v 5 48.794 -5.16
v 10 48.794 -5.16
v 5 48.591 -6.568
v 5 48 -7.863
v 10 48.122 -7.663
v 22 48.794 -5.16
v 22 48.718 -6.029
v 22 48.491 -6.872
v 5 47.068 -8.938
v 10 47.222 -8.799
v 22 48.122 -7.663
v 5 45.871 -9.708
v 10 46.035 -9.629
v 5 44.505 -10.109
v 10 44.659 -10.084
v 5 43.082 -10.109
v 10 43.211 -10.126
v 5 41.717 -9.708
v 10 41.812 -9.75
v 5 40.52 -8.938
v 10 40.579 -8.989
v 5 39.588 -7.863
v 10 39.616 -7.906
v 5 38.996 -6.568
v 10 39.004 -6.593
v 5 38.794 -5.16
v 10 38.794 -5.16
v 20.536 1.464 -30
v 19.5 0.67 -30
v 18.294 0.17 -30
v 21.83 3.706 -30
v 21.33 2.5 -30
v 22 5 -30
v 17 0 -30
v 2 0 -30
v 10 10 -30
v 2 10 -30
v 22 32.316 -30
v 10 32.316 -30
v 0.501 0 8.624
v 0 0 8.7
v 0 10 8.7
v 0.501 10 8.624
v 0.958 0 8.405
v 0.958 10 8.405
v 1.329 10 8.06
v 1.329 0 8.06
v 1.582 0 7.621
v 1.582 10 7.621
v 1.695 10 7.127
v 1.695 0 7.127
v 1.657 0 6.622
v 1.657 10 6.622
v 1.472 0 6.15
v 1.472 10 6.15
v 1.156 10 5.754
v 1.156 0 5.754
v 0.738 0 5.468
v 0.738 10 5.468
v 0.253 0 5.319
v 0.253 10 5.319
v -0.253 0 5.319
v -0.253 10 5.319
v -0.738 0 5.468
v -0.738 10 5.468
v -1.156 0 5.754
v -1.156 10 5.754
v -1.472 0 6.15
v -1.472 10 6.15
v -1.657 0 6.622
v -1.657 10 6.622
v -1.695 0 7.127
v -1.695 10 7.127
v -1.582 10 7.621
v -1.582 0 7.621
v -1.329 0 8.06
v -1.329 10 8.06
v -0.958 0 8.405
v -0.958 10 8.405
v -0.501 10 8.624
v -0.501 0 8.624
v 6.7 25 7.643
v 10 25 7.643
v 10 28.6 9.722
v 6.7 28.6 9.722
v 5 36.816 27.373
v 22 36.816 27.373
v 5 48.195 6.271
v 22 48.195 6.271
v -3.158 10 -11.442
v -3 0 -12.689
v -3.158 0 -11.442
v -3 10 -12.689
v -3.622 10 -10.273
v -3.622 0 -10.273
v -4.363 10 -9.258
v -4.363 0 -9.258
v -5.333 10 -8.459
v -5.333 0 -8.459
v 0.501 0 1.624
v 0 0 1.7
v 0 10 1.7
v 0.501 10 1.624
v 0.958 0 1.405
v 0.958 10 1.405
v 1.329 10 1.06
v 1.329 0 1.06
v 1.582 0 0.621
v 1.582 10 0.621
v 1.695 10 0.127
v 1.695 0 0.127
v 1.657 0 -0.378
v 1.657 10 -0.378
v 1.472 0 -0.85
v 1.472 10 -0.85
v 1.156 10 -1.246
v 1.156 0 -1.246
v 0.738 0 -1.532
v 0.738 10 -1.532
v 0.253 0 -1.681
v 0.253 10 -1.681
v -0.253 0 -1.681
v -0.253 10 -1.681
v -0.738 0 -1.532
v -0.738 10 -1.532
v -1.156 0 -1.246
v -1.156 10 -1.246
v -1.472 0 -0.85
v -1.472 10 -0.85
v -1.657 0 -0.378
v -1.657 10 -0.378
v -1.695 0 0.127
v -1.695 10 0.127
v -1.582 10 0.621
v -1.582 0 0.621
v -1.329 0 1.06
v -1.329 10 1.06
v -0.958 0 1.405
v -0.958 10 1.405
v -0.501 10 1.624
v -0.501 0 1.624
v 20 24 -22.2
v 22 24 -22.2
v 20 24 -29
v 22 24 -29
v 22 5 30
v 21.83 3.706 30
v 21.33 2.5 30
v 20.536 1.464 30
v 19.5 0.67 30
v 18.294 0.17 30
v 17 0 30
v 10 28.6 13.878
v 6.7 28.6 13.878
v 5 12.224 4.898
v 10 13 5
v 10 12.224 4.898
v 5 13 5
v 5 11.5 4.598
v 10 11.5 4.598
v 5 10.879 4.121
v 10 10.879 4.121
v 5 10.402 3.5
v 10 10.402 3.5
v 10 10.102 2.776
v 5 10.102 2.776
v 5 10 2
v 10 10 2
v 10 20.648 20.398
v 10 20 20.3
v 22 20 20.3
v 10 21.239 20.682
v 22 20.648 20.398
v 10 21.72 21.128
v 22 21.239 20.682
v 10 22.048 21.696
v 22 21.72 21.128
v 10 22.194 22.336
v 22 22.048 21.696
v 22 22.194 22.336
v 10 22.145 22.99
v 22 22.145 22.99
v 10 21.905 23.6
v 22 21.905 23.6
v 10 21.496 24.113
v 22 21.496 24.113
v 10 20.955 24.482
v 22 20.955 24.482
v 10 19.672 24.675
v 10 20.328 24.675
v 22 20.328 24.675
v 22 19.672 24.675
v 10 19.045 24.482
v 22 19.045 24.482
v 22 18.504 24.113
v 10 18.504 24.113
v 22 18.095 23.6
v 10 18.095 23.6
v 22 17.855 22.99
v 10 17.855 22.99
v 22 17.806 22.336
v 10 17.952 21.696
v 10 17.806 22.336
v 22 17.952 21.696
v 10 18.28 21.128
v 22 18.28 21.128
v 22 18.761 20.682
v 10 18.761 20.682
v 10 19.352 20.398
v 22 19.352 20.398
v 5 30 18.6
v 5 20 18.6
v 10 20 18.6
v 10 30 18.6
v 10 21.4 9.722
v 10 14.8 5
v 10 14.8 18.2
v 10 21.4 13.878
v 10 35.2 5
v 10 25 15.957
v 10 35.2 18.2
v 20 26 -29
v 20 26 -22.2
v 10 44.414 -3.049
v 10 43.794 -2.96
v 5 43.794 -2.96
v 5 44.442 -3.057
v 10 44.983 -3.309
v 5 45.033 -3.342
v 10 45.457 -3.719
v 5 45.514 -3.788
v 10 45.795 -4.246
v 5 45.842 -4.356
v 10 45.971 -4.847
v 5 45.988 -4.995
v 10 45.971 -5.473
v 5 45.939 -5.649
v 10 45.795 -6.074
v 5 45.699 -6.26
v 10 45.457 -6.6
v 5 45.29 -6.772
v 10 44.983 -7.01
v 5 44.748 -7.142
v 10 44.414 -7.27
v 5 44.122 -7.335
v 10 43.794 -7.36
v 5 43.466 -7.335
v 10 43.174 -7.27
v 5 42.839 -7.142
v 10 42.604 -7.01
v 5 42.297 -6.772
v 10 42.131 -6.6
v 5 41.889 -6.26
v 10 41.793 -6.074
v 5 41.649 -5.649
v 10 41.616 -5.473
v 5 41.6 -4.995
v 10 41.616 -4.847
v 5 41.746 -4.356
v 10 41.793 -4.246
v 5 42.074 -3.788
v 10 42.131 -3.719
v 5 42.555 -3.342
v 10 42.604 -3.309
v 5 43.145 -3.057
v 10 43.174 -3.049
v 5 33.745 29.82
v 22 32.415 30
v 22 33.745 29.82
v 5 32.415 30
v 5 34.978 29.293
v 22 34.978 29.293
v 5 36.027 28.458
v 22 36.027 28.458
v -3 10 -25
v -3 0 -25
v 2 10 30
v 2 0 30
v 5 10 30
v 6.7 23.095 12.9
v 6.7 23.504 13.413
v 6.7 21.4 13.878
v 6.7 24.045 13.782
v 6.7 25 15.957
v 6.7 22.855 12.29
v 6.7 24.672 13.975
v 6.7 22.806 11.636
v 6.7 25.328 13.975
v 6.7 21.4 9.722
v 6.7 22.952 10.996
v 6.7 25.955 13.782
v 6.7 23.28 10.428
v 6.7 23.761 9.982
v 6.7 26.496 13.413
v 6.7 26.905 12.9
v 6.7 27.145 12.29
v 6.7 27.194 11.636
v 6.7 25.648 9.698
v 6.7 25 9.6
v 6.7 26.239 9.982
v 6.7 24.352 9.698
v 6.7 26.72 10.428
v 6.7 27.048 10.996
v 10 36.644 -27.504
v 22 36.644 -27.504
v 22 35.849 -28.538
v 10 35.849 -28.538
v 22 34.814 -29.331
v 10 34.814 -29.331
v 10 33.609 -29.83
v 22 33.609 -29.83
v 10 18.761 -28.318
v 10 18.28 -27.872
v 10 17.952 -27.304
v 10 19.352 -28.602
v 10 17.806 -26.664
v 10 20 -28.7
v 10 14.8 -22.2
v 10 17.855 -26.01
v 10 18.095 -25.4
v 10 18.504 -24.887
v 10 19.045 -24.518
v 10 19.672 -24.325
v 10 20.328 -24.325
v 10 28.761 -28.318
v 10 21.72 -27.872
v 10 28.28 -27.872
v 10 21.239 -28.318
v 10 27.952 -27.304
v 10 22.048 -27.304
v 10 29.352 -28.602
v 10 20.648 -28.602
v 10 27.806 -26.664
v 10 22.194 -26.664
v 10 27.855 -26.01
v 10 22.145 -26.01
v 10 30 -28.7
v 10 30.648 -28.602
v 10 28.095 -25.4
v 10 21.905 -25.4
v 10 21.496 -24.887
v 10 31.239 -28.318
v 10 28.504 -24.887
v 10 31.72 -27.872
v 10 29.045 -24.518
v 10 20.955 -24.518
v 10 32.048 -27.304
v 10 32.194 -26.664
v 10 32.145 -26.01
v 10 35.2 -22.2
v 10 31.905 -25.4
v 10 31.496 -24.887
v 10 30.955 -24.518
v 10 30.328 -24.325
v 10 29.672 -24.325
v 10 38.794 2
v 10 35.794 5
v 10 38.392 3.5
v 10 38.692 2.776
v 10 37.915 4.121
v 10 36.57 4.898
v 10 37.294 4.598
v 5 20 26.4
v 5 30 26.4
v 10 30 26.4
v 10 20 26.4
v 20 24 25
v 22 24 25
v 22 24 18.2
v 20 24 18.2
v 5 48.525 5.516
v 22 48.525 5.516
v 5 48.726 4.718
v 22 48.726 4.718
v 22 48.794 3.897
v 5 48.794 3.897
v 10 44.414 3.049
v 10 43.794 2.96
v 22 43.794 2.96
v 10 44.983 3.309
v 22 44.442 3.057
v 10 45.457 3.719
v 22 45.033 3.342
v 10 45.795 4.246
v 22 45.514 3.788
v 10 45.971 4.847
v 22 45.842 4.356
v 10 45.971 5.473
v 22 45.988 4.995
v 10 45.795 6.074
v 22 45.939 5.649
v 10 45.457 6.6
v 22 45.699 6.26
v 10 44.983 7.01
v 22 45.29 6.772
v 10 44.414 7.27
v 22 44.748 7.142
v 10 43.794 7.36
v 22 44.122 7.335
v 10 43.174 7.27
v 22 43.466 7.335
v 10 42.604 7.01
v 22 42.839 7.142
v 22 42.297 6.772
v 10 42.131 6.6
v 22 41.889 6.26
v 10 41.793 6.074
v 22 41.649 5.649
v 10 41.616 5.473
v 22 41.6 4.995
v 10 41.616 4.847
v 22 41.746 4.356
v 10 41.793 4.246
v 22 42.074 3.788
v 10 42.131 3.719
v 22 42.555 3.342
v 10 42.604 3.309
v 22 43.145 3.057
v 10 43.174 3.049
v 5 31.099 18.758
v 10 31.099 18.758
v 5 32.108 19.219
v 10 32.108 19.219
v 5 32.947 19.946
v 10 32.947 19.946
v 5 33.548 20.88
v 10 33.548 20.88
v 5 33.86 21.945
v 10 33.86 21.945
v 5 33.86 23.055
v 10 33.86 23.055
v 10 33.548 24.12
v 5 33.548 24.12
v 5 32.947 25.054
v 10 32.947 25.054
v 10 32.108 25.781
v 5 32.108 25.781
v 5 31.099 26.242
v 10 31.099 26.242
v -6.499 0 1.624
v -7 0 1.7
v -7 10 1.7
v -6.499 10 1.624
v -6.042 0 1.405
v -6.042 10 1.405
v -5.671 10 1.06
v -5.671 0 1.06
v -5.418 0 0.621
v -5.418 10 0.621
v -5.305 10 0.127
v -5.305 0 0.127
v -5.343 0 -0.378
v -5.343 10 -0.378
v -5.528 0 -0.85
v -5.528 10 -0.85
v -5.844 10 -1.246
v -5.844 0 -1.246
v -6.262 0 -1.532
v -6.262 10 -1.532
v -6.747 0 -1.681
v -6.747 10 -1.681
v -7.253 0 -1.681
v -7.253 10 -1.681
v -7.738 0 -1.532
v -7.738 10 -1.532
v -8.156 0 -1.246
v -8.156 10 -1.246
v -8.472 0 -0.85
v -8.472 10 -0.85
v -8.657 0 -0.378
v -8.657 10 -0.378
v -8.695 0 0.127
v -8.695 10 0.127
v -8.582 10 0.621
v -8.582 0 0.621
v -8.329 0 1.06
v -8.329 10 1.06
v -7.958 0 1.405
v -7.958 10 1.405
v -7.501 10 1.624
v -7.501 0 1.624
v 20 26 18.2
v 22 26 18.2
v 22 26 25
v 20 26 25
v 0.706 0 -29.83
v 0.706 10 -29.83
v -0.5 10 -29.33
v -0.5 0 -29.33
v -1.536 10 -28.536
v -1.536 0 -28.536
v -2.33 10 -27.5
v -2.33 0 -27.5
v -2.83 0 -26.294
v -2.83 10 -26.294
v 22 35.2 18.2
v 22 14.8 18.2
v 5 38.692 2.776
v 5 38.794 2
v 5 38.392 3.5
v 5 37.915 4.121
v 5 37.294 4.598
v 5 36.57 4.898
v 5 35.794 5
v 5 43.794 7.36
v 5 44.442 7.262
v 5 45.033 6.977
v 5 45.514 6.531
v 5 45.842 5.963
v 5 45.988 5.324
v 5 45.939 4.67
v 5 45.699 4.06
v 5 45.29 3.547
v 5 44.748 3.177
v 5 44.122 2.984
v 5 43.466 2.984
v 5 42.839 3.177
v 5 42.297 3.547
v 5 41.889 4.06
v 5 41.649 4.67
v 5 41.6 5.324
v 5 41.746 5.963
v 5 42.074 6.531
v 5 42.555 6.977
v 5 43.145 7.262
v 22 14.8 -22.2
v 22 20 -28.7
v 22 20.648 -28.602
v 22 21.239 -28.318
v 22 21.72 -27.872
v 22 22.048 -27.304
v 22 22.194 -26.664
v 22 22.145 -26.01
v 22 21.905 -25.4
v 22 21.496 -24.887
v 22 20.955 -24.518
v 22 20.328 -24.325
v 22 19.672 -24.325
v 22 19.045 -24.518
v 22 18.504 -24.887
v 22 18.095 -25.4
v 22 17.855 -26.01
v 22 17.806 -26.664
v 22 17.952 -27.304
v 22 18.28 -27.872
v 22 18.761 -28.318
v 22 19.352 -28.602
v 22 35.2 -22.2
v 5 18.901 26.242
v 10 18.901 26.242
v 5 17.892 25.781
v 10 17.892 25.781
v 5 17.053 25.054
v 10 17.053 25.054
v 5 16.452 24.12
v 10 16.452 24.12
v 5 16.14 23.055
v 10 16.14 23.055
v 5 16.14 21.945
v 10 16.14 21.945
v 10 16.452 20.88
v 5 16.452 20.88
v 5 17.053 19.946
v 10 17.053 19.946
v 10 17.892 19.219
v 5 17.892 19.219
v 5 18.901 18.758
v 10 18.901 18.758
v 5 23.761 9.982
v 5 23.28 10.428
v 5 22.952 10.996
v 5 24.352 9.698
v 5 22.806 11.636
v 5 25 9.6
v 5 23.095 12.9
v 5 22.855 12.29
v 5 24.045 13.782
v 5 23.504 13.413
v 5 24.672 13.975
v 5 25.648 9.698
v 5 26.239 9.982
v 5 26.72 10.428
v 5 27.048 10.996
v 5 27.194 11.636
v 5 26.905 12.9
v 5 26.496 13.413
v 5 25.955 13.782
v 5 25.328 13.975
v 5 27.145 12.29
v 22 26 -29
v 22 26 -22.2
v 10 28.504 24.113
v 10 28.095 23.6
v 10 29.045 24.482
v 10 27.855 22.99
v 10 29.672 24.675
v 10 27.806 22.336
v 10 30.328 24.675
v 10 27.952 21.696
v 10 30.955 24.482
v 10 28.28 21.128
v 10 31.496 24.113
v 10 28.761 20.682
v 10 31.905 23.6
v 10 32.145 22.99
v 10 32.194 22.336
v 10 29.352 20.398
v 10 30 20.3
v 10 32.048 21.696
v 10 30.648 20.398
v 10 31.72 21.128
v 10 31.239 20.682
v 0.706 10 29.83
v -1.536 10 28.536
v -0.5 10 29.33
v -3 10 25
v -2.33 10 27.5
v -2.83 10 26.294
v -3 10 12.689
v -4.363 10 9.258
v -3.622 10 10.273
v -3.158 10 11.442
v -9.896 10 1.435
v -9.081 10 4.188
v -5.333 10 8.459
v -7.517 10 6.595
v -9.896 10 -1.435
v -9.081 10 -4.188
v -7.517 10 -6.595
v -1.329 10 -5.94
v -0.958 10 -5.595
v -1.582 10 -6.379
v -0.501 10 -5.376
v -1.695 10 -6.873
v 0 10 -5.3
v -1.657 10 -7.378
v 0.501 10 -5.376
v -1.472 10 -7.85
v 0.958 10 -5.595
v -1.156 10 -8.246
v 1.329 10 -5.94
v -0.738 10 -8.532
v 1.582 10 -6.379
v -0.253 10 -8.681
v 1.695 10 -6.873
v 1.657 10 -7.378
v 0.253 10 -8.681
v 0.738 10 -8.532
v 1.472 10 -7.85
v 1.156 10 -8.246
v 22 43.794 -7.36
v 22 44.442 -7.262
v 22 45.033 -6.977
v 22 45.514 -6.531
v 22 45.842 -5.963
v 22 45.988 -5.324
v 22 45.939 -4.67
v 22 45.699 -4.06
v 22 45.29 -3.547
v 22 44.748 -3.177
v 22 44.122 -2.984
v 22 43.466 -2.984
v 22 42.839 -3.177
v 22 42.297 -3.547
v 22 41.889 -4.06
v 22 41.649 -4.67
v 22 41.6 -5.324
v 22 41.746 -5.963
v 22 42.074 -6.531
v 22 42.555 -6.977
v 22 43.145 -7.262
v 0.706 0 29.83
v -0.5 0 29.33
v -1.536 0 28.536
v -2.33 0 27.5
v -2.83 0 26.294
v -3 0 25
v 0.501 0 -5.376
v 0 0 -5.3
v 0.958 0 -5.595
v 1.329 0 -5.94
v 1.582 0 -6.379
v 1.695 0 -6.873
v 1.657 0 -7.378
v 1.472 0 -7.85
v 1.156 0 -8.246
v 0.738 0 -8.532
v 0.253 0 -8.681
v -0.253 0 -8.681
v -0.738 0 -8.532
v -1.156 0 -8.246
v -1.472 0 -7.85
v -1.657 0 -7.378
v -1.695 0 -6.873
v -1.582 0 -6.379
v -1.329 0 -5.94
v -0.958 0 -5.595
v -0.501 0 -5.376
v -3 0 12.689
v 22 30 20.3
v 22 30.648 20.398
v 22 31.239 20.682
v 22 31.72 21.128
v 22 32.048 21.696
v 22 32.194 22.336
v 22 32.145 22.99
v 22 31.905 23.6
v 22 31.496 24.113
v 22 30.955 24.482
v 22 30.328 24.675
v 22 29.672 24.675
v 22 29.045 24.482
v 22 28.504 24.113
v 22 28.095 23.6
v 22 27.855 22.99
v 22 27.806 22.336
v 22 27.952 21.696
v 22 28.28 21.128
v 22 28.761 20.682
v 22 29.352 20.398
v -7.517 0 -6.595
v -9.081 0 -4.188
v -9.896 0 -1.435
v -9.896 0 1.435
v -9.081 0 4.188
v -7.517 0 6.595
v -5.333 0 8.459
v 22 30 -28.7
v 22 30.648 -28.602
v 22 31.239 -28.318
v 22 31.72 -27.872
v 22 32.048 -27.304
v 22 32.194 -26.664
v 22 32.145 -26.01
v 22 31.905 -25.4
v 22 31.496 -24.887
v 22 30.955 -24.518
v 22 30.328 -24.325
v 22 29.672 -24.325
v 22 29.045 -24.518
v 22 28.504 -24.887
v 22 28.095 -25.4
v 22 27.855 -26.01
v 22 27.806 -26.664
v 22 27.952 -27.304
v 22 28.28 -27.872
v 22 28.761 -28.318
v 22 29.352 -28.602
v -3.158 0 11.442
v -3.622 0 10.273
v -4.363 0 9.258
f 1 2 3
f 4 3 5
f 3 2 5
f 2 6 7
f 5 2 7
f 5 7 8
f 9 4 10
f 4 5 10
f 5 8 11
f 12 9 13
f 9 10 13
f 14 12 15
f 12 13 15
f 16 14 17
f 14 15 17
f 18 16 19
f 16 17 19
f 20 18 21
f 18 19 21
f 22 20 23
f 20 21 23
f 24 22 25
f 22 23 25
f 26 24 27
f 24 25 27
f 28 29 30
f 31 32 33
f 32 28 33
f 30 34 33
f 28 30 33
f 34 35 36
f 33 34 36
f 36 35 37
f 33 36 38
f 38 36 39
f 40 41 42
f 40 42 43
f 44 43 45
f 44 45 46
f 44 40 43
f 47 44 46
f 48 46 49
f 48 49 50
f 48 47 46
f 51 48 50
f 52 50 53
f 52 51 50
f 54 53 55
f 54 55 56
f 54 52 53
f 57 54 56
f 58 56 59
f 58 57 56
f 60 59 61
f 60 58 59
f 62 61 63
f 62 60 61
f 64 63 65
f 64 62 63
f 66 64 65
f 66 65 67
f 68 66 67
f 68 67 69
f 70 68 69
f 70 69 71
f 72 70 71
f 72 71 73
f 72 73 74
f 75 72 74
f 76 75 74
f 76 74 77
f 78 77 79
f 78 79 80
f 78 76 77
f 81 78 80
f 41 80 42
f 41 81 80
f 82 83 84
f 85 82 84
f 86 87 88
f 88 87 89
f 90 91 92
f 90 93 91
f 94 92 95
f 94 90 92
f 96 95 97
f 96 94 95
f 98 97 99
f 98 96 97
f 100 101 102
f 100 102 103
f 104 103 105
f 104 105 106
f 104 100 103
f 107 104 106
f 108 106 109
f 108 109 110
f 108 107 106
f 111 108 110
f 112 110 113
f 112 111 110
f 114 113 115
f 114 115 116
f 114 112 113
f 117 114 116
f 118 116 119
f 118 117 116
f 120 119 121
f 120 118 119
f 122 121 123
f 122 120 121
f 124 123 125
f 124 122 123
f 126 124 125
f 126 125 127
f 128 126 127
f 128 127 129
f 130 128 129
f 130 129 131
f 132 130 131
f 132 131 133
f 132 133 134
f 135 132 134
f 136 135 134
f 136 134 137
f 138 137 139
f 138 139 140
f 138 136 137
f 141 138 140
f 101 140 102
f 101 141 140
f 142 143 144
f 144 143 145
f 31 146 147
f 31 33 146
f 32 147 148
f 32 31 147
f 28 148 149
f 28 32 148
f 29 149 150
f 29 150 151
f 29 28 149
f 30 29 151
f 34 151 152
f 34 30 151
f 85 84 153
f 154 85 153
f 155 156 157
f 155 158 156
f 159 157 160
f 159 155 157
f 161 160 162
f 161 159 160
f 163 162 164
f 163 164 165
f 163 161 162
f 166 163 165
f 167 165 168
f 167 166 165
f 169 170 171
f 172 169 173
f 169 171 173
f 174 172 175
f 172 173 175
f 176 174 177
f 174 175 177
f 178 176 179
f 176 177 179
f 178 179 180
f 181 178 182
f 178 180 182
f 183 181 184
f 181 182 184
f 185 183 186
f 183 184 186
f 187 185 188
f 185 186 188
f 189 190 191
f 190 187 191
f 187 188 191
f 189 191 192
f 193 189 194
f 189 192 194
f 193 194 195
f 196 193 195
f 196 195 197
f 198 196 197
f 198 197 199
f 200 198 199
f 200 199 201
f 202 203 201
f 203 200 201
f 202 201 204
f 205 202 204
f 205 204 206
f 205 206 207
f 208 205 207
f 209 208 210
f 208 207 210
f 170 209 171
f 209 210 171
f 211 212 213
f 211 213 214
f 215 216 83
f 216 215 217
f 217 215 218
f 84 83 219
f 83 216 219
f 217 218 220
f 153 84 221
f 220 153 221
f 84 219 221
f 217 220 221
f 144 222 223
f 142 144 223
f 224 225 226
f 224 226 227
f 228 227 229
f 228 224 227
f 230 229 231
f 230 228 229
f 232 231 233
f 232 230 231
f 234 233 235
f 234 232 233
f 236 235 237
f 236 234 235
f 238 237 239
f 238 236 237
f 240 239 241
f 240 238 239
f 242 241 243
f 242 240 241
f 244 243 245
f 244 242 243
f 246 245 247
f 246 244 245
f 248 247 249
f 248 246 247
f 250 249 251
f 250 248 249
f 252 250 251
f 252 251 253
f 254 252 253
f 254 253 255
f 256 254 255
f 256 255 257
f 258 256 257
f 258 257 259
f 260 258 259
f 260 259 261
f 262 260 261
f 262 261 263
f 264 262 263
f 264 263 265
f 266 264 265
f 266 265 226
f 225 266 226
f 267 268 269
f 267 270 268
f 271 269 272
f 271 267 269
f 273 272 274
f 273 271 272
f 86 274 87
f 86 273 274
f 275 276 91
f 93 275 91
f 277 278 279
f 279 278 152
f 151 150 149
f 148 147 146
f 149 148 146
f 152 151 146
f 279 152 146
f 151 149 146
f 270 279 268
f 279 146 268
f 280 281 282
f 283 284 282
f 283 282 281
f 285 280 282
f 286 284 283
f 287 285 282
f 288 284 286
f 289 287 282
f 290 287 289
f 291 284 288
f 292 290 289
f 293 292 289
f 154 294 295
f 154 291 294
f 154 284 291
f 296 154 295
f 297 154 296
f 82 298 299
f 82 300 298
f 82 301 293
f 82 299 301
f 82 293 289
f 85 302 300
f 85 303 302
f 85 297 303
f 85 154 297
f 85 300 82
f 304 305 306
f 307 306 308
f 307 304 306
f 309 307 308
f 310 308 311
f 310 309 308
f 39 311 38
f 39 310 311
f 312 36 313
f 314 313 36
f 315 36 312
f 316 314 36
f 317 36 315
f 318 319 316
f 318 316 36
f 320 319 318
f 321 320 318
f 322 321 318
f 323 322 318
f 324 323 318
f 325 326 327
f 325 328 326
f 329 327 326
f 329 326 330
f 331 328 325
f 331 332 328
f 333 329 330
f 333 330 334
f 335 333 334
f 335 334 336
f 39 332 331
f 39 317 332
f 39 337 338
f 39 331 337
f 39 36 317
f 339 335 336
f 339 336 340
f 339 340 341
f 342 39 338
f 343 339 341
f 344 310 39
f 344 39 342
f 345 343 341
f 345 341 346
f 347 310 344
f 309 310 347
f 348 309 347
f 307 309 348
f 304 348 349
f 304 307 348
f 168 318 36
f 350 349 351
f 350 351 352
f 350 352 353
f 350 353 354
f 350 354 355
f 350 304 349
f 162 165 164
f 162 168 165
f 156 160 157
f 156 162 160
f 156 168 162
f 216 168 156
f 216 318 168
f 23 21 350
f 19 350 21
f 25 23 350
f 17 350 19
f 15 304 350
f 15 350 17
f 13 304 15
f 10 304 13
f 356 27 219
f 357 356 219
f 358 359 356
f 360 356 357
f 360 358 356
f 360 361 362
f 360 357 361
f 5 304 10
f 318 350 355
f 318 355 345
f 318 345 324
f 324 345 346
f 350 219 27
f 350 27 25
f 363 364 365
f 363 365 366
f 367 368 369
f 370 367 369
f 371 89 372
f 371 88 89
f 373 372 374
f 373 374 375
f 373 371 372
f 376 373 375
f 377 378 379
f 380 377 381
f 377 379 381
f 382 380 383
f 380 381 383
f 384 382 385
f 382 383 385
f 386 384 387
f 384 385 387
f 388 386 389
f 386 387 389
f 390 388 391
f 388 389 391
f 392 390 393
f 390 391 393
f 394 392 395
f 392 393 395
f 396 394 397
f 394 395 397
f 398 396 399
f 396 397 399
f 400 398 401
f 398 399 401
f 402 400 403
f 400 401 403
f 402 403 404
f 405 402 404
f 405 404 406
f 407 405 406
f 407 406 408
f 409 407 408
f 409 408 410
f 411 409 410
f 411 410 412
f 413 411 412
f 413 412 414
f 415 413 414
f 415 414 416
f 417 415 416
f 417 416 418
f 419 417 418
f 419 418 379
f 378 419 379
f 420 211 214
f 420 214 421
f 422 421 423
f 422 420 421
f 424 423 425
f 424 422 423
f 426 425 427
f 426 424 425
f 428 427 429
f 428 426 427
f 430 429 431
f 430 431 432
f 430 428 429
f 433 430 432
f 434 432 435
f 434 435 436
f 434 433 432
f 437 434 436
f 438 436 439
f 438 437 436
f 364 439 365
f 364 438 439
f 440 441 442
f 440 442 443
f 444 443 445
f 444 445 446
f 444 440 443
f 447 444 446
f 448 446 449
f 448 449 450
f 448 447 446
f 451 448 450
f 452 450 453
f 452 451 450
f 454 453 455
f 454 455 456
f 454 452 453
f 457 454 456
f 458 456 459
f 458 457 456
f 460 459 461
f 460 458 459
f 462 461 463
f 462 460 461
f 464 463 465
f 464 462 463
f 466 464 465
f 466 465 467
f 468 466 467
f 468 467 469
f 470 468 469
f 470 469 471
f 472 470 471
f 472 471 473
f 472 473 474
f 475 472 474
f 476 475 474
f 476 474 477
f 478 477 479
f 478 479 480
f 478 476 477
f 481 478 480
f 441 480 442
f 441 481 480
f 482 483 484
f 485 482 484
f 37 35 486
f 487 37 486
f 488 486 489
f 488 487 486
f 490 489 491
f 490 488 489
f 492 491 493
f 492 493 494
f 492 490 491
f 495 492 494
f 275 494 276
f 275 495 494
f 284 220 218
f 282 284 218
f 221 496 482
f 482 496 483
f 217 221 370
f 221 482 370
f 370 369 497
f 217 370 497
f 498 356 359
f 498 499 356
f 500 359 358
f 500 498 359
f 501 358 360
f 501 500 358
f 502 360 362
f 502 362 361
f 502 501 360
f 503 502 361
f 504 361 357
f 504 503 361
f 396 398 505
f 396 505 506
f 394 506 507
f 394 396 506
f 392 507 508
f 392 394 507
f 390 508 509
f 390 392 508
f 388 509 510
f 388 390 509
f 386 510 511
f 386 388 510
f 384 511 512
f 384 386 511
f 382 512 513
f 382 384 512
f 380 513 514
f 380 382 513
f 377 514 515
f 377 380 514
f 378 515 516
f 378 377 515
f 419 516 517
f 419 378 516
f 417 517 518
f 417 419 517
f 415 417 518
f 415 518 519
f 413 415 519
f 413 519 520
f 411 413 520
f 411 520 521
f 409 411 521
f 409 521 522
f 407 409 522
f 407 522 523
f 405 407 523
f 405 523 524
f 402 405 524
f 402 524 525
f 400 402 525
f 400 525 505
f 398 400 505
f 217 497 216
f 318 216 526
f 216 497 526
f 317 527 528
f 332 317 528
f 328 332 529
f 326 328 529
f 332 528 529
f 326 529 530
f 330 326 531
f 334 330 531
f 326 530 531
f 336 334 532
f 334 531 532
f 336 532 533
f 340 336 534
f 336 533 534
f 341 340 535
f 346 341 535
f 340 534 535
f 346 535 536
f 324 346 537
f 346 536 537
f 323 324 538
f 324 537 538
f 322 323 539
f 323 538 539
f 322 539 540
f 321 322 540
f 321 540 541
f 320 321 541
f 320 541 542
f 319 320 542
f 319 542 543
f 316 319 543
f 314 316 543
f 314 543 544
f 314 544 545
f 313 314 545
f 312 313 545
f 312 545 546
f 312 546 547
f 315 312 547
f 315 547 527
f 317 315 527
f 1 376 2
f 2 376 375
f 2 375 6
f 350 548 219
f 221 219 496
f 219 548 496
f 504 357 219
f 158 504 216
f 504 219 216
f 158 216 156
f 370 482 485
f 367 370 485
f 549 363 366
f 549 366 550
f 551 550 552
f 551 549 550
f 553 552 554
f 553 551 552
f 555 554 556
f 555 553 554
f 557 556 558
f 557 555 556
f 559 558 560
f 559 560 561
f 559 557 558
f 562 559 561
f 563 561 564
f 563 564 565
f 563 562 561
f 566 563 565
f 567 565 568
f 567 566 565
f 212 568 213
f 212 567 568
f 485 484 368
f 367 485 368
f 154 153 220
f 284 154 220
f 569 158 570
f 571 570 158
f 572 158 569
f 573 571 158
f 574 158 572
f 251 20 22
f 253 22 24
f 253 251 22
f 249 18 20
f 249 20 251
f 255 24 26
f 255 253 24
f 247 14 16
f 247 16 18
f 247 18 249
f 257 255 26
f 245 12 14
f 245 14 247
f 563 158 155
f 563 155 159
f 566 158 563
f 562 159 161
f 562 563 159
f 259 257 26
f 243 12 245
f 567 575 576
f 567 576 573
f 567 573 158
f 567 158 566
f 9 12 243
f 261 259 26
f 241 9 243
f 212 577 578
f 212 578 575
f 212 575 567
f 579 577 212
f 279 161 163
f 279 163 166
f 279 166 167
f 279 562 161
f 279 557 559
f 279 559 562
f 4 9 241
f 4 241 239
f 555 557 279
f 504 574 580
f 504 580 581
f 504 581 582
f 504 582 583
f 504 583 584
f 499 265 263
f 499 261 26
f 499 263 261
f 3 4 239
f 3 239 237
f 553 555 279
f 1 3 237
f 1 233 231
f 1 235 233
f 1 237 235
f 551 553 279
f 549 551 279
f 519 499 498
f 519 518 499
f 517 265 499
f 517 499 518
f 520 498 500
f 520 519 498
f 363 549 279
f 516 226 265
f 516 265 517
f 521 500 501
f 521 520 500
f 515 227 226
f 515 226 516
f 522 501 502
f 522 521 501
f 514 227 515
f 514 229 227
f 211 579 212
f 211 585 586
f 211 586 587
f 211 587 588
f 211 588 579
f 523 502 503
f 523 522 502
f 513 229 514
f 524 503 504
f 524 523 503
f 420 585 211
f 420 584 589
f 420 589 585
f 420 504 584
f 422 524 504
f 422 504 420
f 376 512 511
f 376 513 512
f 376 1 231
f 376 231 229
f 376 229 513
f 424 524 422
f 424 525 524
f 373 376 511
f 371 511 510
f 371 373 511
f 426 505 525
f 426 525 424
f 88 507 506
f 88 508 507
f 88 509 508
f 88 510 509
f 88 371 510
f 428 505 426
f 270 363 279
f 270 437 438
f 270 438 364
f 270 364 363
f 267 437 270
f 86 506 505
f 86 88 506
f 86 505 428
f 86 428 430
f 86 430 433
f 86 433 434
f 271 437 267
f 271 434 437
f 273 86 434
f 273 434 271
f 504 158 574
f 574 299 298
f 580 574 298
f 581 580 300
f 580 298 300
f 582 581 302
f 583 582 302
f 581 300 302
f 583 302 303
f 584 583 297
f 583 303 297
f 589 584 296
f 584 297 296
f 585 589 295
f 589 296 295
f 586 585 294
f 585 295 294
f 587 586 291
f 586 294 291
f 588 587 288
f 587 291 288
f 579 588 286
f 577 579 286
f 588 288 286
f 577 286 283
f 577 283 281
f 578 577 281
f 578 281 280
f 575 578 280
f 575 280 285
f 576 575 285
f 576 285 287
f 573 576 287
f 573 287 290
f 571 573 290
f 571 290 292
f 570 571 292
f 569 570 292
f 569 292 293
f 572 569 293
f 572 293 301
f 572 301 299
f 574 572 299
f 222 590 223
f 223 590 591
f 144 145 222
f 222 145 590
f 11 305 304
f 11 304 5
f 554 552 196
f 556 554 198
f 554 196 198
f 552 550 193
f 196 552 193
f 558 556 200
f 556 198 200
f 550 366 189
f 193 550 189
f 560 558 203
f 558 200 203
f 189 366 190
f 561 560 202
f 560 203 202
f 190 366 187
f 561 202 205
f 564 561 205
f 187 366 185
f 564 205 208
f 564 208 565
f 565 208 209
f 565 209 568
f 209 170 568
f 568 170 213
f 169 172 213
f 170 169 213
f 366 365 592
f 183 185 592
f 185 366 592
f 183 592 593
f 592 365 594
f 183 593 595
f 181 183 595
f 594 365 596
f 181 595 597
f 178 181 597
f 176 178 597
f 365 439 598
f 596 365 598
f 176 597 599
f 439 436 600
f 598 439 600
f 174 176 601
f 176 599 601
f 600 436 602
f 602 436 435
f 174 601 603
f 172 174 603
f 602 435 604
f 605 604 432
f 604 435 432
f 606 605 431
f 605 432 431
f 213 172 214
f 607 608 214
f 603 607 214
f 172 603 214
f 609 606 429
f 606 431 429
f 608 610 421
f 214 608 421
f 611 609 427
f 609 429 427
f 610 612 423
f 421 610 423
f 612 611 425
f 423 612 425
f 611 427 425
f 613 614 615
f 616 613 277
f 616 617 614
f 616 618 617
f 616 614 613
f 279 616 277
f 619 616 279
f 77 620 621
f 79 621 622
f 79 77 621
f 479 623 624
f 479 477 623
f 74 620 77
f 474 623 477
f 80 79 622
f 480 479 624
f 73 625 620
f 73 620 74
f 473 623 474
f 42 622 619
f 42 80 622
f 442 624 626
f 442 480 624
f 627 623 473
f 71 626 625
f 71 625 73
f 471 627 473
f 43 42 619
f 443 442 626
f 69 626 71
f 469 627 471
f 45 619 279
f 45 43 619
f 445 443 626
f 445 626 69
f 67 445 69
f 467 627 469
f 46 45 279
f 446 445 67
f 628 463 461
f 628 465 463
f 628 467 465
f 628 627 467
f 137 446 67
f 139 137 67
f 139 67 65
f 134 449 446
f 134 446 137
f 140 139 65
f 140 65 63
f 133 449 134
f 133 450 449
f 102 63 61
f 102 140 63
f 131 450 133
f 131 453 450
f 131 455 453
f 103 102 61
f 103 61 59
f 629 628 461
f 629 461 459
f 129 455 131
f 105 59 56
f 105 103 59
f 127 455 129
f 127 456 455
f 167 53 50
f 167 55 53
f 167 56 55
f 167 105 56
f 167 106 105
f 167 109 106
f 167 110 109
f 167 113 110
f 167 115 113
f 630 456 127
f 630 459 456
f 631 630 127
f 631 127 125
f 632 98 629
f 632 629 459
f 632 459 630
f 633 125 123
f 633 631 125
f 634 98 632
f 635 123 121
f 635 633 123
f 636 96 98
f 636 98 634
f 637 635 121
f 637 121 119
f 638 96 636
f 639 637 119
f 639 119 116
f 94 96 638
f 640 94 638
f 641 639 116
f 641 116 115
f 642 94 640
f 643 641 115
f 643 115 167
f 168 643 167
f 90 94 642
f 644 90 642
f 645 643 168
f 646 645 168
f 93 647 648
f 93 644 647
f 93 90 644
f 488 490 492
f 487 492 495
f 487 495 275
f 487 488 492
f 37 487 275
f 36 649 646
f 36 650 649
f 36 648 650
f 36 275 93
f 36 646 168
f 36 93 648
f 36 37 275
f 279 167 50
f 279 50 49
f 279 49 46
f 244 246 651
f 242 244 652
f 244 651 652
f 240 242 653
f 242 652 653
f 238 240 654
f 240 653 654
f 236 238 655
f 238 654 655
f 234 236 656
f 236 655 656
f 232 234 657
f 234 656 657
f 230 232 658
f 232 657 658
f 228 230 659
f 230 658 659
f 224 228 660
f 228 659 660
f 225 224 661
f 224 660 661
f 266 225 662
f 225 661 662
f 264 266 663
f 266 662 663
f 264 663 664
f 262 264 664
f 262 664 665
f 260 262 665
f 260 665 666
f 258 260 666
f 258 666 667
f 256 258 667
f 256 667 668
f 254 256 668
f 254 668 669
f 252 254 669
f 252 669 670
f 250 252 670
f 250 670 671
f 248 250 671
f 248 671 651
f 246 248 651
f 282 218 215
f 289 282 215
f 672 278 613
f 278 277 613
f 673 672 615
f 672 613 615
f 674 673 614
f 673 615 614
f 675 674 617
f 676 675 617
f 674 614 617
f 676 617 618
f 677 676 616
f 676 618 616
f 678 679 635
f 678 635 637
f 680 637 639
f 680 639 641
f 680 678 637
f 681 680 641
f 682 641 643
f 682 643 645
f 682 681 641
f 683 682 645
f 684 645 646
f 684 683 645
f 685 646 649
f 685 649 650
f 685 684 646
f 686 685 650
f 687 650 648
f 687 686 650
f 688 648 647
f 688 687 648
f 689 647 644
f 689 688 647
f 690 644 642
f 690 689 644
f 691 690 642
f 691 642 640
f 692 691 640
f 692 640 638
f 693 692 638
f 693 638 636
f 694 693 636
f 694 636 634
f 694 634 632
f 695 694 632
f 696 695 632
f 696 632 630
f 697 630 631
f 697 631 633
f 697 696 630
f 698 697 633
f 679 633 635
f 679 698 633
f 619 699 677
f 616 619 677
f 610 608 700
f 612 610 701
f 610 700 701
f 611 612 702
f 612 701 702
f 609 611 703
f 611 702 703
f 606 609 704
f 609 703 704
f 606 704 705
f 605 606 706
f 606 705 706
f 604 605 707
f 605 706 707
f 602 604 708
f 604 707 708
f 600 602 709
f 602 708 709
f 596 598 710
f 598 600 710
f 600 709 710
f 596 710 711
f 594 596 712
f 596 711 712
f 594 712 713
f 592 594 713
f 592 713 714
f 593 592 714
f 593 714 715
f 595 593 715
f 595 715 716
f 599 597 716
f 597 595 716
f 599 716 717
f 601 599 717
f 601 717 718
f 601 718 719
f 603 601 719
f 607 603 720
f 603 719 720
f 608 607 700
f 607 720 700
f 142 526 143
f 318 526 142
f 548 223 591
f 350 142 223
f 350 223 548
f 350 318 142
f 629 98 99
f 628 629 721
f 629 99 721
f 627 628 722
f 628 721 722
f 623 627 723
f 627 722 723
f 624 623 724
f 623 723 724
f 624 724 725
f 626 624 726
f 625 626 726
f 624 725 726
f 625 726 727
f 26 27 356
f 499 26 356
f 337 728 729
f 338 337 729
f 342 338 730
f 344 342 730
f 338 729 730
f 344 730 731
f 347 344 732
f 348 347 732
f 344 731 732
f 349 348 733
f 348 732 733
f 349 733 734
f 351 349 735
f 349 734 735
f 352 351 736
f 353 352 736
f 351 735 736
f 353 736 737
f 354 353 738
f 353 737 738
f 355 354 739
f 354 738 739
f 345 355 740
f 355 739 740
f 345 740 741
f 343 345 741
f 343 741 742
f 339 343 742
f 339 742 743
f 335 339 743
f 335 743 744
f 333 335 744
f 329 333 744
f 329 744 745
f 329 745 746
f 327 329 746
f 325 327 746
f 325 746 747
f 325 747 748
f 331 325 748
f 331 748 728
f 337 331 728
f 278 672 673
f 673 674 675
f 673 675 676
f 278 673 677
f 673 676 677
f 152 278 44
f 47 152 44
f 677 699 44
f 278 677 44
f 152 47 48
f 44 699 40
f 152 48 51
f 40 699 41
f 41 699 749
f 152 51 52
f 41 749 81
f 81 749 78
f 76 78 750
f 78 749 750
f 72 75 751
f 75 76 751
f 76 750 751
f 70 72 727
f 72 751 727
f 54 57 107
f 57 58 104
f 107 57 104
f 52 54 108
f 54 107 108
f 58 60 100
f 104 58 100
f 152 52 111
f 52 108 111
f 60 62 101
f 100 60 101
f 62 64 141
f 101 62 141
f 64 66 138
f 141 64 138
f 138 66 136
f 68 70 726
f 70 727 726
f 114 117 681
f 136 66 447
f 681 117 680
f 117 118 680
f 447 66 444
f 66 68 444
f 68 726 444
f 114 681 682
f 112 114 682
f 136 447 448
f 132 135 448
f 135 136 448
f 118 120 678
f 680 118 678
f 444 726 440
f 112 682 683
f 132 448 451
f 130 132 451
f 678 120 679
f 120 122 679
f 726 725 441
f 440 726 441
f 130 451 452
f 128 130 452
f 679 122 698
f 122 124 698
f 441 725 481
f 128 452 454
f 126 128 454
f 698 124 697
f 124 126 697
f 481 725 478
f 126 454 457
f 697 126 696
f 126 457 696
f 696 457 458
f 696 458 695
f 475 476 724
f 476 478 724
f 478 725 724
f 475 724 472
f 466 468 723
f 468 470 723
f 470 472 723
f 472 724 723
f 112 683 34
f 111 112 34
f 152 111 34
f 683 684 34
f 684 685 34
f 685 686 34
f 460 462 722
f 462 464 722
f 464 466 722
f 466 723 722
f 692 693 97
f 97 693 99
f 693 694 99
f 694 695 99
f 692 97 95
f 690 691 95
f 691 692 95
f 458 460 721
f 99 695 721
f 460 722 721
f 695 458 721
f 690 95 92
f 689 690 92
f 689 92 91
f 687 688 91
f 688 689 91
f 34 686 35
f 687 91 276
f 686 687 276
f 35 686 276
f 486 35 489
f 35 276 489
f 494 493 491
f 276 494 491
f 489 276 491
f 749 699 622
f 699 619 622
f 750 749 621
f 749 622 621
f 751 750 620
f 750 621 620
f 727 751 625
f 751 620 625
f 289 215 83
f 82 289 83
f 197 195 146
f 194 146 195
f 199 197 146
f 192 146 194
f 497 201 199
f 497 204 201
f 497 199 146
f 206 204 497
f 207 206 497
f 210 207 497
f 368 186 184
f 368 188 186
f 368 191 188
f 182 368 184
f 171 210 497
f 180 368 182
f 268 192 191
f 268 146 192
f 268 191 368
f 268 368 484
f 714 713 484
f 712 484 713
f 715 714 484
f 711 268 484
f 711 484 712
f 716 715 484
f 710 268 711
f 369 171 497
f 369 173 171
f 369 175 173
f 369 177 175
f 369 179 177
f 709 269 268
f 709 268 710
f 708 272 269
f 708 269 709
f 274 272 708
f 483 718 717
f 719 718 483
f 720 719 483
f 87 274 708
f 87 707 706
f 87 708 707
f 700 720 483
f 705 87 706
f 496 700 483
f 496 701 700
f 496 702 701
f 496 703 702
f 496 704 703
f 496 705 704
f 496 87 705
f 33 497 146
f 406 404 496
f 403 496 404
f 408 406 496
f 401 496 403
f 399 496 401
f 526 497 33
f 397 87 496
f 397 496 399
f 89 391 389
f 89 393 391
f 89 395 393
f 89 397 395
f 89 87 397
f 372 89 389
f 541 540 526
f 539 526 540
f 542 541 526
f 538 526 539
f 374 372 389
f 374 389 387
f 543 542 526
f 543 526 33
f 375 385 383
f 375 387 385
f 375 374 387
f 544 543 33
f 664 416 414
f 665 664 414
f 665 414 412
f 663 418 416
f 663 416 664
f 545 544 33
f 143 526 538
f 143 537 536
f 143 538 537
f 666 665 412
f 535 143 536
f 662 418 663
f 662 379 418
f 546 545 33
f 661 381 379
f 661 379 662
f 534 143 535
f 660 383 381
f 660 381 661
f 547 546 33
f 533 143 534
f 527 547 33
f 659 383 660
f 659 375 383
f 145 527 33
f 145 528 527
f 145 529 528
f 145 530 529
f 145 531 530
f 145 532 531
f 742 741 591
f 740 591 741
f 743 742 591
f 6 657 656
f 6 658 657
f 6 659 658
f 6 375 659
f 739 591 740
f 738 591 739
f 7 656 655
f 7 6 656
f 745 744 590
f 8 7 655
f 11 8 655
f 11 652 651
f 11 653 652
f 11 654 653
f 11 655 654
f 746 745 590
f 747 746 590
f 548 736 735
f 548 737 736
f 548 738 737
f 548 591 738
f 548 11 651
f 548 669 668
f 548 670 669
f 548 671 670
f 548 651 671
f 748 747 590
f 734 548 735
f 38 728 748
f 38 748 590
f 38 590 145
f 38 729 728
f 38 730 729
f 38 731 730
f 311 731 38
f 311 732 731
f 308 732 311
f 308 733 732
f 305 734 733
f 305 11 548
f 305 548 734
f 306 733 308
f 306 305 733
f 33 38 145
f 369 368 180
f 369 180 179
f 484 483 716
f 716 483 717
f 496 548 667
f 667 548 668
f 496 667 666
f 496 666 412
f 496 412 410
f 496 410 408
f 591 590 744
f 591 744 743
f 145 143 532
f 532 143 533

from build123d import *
from build123d.topology import SkipClean

# Parameters (mm, degrees)
SKETCH_1_W           = 20
SKETCH_1_H           = 60.00000000000001
SKETCH_1_R           = 1.7000000000000004
SKETCH_1_R_2         = 1.7
EXTRUDE_1_DEPTH      = 10
SKETCH_6_W           = 60.00000000000001
SKETCH_6_H           = 50.00000000000001
EXTRUDE_4_DEPTH      = 12
SKETCH_7_R           = 2.200000000000002
SKETCH_7_R_2         = 2.2
CUT_EXTRUDE_3_DEPTH  = 67.51315659326356
EXTRUDE_5_OUTLINE_R  = 2.2
EXTRUDE_5_DEPTH      = 5
CUT_EXTRUDE_7_DEPTH  = 5
SKETCH_14_R          = 2.2
CUT_EXTRUDE_8_DEPTH  = 5
CUT_EXTRUDE_START    = -17
CUT_EXTRUDE_9_DEPTH  = 17
SKETCH_18_W          = 6.800000000000008
SKETCH_18_H          = 2.000000000000014
SKETCH_18_W_2        = 6.799999999999994
SKETCH_18_H_2        = 2.0000000000000036
EXTRUDE_10_DEPTH     = 10
CUT_EXTRUDE_10_DEPTH = 62.35829229692095
CUT_EXTRUDE_11_DEPTH = 3.3
FILLET_1_R           = 5
FILLET_2_R           = 3


# Read off the part's stored shape, not the designer's step: 凸台-拉伸5
with BuildPart() as part:
    # 草图1 → 凸台-拉伸1 (new body)
    with BuildSketch(Plane(origin=(0, 0, 0), x_dir=(1, 0, 0), z_dir=(0, 1, 0))):
        Rectangle(SKETCH_1_W, SKETCH_1_H)
        with Locations(Location((-7.000000000000025, 5.2e-15, 0), (0, 0, 270))):
            Circle(SKETCH_1_R, mode=Mode.SUBTRACT)
        with Locations(Location((-2.429e-14, 5.2e-15, 0), (0, 0, 270))):
            Circle(SKETCH_1_R_2, mode=Mode.SUBTRACT)
        with Locations(Location((2.949e-14, 7.000000000000025, 0), (0, 0, 270))):
            Circle(SKETCH_1_R, mode=Mode.SUBTRACT)
        with Locations(Location((-4.48e-15, -7.000000000000048, 0), (0, 0, 270))):
            Circle(SKETCH_1_R, mode=Mode.SUBTRACT)
    extrude(amount=EXTRUDE_1_DEPTH)

    # 草图6 → 凸台-拉伸4 (add)
    with BuildSketch(Plane(origin=(10, 0, 0), x_dir=(0, 0, -1), z_dir=(1, 0, 0))):
        with Locations((0, 25.000000000000004)):
            Rectangle(SKETCH_6_W, SKETCH_6_H)
    extrude(amount=EXTRUDE_4_DEPTH)

    # 草图7 → 切除-拉伸3 (cut, through all)
    with BuildSketch(Plane(origin=(22, 0, 0), x_dir=(0, 0, -1), z_dir=(1, 0, 0))):
        with Locations((-22.500000000000014, 30)):
            Circle(SKETCH_7_R)
        with Locations((-22.500000000000014, 20)):
            Circle(SKETCH_7_R)
        Polygon((-18.20000000000001, 14.8), (22.199999999999985, 14.800000000000002), (22.199999999999985, 35.2), (-18.20000000000001, 35.2), align=None)
        with Locations((26.49999999999999, 30.000000000000007)):
            Circle(SKETCH_7_R)
        with Locations((26.49999999999999, 20.000000000000004)):
            Circle(SKETCH_7_R)
        Polygon((22.199999999999985, 26.00000000000001), (22.199999999999985, 23.999999999999996), (28.999999999999986, 24.000000000000004), (28.99999999999999, 26.00000000000001), align=None)
        Polygon((-25.000000000000014, 24), (-18.200000000000014, 24), (-18.20000000000001, 26.000000000000004), (-25.000000000000014, 26.000000000000004), align=None)
        with Locations((-5.159597133486693, 43.79385241571819)):
            Circle(SKETCH_7_R_2)
        with Locations((5.159597133486693, 43.79385241571819)):
            Circle(SKETCH_7_R_2)
    extrude(amount=-CUT_EXTRUDE_3_DEPTH, mode=Mode.SUBTRACT)

    # 凸台-拉伸5 outline → 凸台-拉伸5 (add)
    with SkipClean():  # the faces are left unmerged after this step: merging them gives an invalid solid
        with BuildSketch(Plane.ZY.offset(-10)):
            with BuildLine():
                Line((30, 10), (30, 35.4))
                Line((30, 35.4), (5.159597133, 48.793852416))
                Line((5.159597133, 48.793852416), (-5.159597133, 48.793852416))
                ThreePointArc((-5.159597133, 48.793852416), (-10.159597133, 43.793852416), (-5.159597133, 38.793852416))
                Line((-5.159597133, 38.793852416), (5, 38.793852416))
                Line((5, 38.793852416), (5, 10))
                Line((5, 10), (30, 10))
            make_face()
            with Locations((22.5, 20)):
                Circle(EXTRUDE_5_OUTLINE_R, mode=Mode.SUBTRACT)
            with Locations((-5.159597133, 43.793852416)):
                Circle(EXTRUDE_5_OUTLINE_R, mode=Mode.SUBTRACT)
            with Locations((5.159597133, 43.793852416)):
                Circle(EXTRUDE_5_OUTLINE_R, mode=Mode.SUBTRACT)
            with Locations((22.5, 30)):
                Circle(EXTRUDE_5_OUTLINE_R, mode=Mode.SUBTRACT)
        extrude(amount=EXTRUDE_5_DEPTH)

    # 草图13 → 切除-拉伸7 (cut)
    with BuildSketch(Plane.ZY.offset(-5)):
        with BuildLine():
            Line((26.400000000000016, 30), (26.400000000000016, 20))
            ThreePointArc((26.400000000000016, 20), (22.500000000000014, 16.099999999999998), (18.600000000000012, 20))
            Line((18.600000000000012, 20), (18.60000000000001, 30))
            ThreePointArc((18.60000000000001, 30), (22.500000000000014, 33.900000000000006), (26.400000000000016, 30))
        make_face()
    extrude(amount=-CUT_EXTRUDE_7_DEPTH, mode=Mode.SUBTRACT)

    # 草图14 → 切除-拉伸8 (cut)
    with BuildSketch(Plane(origin=(10, 0, 0), x_dir=(0, 0, -1), z_dir=(1, 0, 0))):
        with Locations((-11.800000000000018, 25)):
            Circle(SKETCH_14_R)
    extrude(amount=-CUT_EXTRUDE_8_DEPTH, mode=Mode.SUBTRACT)

    # 草图16 → 切除-拉伸9 (cut)
    with BuildSketch(Plane.ZY.offset(-5).offset(CUT_EXTRUDE_START)):
        with BuildLine():
            Line((5.159597133486693, 48.793852415718185), (30, 35.40000000000001))
            Line((30, 35.40000000000001), (30, 50))
            Line((30, 50), (-30, 50))
            Line((-30, 50), (-29.999999999999996, 35.2))
            Line((-29.999999999999996, 35.2), (-7.663336701878596, 48.121818239713186))
            ThreePointArc((-7.663336701878596, 48.121818239713186), (-6.455778231949604, 48.622922156360524), (-5.1595971334867095, 48.793852415718185))
            Line((-5.1595971334867095, 48.793852415718185), (5.159597133486693, 48.793852415718185))
        make_face()
    extrude(amount=CUT_EXTRUDE_9_DEPTH, mode=Mode.SUBTRACT)

    # 草图18 → 凸台-拉伸10 (add)
    with BuildSketch(Plane.ZY.offset(-10)):
        with Locations((-25.599999999999987, 25.000000000000004)):
            Rectangle(SKETCH_18_W, SKETCH_18_H)
        with Locations((21.60000000000001, 25)):
            Rectangle(SKETCH_18_W_2, SKETCH_18_H_2)
    extrude(amount=-EXTRUDE_10_DEPTH)

    # 草图19 → 切除-拉伸10 (cut, through all)
    with BuildSketch(Plane.XZ):
        with BuildLine():
            Line((-3.0000000000000244, 9.539392014169463), (-3.0000000000000244, 30))
            Line((-3.0000000000000244, 30), (-10, 30))
            Line((-10, 30), (-10, -1.2700383e-09))
            ThreePointArc((-10.000000000000028, -1.27003874e-09), (-8.06225774867426, 5.916079782587651), (-3.000000000000024, 9.539392014169465))
        make_face()
        with BuildLine():
            ThreePointArc((-3.0000000000000244, -9.539392014169461), (-8.062257747922892, -5.916079783611588), (-10.000000000000028, -1.27003874e-09))
            Line((-10, -1.2700383e-09), (-10, -30))
            Line((-10, -30), (-3.000000000000025, -30))
            Line((-3.0000000000000244, -30), (-3.0000000000000244, -9.539392014169465))
        make_face()
    extrude(amount=-CUT_EXTRUDE_10_DEPTH, mode=Mode.SUBTRACT)

    # 草图20 → 切除-拉伸11 (cut)
    with BuildSketch(Plane(origin=(10, 0, 0), x_dir=(0, 0, -1), z_dir=(1, 0, 0))):
        Polygon((-7.643078061834704, 24.999999999999993), (-9.721539030917363, 28.600000000000012), (-13.878460969082674, 28.600000000000012), (-15.956921938165337, 24.999999999999993), (-13.878460969082676, 21.399999999999984), (-9.721539030917361, 21.399999999999984), align=None)
    extrude(amount=-CUT_EXTRUDE_11_DEPTH, mode=Mode.SUBTRACT)

    # 圆角1
    fillet_1_edges = [part.edges().sort_by_distance(p)[0] for p in [
        (13.5, 35.400000000000006, 30),
        (16, 48.793852415718185, 5.159597133486693),
        (16, 35.2, -29.999999999999996),
        (-3.0000000000000244, 5, 30),
        (-3.000000000000024, 5, 9.539392014169465),
        (-3.000000000000025, 5, -30),
        (-3.000000000000025, 5, -9.539392014169465),
        (22, 0, 0),
    ]]
    fillet(fillet_1_edges, radius=FILLET_1_R)

    # 圆角2
    fillet_2_edges = [part.edges().sort_by_distance(p)[0] for p in [
        (7.5, 38.793852416, 5),
        (7.5, 10, 5),
    ]]
    fillet(fillet_2_edges, radius=FILLET_2_R)


solid = part.part
